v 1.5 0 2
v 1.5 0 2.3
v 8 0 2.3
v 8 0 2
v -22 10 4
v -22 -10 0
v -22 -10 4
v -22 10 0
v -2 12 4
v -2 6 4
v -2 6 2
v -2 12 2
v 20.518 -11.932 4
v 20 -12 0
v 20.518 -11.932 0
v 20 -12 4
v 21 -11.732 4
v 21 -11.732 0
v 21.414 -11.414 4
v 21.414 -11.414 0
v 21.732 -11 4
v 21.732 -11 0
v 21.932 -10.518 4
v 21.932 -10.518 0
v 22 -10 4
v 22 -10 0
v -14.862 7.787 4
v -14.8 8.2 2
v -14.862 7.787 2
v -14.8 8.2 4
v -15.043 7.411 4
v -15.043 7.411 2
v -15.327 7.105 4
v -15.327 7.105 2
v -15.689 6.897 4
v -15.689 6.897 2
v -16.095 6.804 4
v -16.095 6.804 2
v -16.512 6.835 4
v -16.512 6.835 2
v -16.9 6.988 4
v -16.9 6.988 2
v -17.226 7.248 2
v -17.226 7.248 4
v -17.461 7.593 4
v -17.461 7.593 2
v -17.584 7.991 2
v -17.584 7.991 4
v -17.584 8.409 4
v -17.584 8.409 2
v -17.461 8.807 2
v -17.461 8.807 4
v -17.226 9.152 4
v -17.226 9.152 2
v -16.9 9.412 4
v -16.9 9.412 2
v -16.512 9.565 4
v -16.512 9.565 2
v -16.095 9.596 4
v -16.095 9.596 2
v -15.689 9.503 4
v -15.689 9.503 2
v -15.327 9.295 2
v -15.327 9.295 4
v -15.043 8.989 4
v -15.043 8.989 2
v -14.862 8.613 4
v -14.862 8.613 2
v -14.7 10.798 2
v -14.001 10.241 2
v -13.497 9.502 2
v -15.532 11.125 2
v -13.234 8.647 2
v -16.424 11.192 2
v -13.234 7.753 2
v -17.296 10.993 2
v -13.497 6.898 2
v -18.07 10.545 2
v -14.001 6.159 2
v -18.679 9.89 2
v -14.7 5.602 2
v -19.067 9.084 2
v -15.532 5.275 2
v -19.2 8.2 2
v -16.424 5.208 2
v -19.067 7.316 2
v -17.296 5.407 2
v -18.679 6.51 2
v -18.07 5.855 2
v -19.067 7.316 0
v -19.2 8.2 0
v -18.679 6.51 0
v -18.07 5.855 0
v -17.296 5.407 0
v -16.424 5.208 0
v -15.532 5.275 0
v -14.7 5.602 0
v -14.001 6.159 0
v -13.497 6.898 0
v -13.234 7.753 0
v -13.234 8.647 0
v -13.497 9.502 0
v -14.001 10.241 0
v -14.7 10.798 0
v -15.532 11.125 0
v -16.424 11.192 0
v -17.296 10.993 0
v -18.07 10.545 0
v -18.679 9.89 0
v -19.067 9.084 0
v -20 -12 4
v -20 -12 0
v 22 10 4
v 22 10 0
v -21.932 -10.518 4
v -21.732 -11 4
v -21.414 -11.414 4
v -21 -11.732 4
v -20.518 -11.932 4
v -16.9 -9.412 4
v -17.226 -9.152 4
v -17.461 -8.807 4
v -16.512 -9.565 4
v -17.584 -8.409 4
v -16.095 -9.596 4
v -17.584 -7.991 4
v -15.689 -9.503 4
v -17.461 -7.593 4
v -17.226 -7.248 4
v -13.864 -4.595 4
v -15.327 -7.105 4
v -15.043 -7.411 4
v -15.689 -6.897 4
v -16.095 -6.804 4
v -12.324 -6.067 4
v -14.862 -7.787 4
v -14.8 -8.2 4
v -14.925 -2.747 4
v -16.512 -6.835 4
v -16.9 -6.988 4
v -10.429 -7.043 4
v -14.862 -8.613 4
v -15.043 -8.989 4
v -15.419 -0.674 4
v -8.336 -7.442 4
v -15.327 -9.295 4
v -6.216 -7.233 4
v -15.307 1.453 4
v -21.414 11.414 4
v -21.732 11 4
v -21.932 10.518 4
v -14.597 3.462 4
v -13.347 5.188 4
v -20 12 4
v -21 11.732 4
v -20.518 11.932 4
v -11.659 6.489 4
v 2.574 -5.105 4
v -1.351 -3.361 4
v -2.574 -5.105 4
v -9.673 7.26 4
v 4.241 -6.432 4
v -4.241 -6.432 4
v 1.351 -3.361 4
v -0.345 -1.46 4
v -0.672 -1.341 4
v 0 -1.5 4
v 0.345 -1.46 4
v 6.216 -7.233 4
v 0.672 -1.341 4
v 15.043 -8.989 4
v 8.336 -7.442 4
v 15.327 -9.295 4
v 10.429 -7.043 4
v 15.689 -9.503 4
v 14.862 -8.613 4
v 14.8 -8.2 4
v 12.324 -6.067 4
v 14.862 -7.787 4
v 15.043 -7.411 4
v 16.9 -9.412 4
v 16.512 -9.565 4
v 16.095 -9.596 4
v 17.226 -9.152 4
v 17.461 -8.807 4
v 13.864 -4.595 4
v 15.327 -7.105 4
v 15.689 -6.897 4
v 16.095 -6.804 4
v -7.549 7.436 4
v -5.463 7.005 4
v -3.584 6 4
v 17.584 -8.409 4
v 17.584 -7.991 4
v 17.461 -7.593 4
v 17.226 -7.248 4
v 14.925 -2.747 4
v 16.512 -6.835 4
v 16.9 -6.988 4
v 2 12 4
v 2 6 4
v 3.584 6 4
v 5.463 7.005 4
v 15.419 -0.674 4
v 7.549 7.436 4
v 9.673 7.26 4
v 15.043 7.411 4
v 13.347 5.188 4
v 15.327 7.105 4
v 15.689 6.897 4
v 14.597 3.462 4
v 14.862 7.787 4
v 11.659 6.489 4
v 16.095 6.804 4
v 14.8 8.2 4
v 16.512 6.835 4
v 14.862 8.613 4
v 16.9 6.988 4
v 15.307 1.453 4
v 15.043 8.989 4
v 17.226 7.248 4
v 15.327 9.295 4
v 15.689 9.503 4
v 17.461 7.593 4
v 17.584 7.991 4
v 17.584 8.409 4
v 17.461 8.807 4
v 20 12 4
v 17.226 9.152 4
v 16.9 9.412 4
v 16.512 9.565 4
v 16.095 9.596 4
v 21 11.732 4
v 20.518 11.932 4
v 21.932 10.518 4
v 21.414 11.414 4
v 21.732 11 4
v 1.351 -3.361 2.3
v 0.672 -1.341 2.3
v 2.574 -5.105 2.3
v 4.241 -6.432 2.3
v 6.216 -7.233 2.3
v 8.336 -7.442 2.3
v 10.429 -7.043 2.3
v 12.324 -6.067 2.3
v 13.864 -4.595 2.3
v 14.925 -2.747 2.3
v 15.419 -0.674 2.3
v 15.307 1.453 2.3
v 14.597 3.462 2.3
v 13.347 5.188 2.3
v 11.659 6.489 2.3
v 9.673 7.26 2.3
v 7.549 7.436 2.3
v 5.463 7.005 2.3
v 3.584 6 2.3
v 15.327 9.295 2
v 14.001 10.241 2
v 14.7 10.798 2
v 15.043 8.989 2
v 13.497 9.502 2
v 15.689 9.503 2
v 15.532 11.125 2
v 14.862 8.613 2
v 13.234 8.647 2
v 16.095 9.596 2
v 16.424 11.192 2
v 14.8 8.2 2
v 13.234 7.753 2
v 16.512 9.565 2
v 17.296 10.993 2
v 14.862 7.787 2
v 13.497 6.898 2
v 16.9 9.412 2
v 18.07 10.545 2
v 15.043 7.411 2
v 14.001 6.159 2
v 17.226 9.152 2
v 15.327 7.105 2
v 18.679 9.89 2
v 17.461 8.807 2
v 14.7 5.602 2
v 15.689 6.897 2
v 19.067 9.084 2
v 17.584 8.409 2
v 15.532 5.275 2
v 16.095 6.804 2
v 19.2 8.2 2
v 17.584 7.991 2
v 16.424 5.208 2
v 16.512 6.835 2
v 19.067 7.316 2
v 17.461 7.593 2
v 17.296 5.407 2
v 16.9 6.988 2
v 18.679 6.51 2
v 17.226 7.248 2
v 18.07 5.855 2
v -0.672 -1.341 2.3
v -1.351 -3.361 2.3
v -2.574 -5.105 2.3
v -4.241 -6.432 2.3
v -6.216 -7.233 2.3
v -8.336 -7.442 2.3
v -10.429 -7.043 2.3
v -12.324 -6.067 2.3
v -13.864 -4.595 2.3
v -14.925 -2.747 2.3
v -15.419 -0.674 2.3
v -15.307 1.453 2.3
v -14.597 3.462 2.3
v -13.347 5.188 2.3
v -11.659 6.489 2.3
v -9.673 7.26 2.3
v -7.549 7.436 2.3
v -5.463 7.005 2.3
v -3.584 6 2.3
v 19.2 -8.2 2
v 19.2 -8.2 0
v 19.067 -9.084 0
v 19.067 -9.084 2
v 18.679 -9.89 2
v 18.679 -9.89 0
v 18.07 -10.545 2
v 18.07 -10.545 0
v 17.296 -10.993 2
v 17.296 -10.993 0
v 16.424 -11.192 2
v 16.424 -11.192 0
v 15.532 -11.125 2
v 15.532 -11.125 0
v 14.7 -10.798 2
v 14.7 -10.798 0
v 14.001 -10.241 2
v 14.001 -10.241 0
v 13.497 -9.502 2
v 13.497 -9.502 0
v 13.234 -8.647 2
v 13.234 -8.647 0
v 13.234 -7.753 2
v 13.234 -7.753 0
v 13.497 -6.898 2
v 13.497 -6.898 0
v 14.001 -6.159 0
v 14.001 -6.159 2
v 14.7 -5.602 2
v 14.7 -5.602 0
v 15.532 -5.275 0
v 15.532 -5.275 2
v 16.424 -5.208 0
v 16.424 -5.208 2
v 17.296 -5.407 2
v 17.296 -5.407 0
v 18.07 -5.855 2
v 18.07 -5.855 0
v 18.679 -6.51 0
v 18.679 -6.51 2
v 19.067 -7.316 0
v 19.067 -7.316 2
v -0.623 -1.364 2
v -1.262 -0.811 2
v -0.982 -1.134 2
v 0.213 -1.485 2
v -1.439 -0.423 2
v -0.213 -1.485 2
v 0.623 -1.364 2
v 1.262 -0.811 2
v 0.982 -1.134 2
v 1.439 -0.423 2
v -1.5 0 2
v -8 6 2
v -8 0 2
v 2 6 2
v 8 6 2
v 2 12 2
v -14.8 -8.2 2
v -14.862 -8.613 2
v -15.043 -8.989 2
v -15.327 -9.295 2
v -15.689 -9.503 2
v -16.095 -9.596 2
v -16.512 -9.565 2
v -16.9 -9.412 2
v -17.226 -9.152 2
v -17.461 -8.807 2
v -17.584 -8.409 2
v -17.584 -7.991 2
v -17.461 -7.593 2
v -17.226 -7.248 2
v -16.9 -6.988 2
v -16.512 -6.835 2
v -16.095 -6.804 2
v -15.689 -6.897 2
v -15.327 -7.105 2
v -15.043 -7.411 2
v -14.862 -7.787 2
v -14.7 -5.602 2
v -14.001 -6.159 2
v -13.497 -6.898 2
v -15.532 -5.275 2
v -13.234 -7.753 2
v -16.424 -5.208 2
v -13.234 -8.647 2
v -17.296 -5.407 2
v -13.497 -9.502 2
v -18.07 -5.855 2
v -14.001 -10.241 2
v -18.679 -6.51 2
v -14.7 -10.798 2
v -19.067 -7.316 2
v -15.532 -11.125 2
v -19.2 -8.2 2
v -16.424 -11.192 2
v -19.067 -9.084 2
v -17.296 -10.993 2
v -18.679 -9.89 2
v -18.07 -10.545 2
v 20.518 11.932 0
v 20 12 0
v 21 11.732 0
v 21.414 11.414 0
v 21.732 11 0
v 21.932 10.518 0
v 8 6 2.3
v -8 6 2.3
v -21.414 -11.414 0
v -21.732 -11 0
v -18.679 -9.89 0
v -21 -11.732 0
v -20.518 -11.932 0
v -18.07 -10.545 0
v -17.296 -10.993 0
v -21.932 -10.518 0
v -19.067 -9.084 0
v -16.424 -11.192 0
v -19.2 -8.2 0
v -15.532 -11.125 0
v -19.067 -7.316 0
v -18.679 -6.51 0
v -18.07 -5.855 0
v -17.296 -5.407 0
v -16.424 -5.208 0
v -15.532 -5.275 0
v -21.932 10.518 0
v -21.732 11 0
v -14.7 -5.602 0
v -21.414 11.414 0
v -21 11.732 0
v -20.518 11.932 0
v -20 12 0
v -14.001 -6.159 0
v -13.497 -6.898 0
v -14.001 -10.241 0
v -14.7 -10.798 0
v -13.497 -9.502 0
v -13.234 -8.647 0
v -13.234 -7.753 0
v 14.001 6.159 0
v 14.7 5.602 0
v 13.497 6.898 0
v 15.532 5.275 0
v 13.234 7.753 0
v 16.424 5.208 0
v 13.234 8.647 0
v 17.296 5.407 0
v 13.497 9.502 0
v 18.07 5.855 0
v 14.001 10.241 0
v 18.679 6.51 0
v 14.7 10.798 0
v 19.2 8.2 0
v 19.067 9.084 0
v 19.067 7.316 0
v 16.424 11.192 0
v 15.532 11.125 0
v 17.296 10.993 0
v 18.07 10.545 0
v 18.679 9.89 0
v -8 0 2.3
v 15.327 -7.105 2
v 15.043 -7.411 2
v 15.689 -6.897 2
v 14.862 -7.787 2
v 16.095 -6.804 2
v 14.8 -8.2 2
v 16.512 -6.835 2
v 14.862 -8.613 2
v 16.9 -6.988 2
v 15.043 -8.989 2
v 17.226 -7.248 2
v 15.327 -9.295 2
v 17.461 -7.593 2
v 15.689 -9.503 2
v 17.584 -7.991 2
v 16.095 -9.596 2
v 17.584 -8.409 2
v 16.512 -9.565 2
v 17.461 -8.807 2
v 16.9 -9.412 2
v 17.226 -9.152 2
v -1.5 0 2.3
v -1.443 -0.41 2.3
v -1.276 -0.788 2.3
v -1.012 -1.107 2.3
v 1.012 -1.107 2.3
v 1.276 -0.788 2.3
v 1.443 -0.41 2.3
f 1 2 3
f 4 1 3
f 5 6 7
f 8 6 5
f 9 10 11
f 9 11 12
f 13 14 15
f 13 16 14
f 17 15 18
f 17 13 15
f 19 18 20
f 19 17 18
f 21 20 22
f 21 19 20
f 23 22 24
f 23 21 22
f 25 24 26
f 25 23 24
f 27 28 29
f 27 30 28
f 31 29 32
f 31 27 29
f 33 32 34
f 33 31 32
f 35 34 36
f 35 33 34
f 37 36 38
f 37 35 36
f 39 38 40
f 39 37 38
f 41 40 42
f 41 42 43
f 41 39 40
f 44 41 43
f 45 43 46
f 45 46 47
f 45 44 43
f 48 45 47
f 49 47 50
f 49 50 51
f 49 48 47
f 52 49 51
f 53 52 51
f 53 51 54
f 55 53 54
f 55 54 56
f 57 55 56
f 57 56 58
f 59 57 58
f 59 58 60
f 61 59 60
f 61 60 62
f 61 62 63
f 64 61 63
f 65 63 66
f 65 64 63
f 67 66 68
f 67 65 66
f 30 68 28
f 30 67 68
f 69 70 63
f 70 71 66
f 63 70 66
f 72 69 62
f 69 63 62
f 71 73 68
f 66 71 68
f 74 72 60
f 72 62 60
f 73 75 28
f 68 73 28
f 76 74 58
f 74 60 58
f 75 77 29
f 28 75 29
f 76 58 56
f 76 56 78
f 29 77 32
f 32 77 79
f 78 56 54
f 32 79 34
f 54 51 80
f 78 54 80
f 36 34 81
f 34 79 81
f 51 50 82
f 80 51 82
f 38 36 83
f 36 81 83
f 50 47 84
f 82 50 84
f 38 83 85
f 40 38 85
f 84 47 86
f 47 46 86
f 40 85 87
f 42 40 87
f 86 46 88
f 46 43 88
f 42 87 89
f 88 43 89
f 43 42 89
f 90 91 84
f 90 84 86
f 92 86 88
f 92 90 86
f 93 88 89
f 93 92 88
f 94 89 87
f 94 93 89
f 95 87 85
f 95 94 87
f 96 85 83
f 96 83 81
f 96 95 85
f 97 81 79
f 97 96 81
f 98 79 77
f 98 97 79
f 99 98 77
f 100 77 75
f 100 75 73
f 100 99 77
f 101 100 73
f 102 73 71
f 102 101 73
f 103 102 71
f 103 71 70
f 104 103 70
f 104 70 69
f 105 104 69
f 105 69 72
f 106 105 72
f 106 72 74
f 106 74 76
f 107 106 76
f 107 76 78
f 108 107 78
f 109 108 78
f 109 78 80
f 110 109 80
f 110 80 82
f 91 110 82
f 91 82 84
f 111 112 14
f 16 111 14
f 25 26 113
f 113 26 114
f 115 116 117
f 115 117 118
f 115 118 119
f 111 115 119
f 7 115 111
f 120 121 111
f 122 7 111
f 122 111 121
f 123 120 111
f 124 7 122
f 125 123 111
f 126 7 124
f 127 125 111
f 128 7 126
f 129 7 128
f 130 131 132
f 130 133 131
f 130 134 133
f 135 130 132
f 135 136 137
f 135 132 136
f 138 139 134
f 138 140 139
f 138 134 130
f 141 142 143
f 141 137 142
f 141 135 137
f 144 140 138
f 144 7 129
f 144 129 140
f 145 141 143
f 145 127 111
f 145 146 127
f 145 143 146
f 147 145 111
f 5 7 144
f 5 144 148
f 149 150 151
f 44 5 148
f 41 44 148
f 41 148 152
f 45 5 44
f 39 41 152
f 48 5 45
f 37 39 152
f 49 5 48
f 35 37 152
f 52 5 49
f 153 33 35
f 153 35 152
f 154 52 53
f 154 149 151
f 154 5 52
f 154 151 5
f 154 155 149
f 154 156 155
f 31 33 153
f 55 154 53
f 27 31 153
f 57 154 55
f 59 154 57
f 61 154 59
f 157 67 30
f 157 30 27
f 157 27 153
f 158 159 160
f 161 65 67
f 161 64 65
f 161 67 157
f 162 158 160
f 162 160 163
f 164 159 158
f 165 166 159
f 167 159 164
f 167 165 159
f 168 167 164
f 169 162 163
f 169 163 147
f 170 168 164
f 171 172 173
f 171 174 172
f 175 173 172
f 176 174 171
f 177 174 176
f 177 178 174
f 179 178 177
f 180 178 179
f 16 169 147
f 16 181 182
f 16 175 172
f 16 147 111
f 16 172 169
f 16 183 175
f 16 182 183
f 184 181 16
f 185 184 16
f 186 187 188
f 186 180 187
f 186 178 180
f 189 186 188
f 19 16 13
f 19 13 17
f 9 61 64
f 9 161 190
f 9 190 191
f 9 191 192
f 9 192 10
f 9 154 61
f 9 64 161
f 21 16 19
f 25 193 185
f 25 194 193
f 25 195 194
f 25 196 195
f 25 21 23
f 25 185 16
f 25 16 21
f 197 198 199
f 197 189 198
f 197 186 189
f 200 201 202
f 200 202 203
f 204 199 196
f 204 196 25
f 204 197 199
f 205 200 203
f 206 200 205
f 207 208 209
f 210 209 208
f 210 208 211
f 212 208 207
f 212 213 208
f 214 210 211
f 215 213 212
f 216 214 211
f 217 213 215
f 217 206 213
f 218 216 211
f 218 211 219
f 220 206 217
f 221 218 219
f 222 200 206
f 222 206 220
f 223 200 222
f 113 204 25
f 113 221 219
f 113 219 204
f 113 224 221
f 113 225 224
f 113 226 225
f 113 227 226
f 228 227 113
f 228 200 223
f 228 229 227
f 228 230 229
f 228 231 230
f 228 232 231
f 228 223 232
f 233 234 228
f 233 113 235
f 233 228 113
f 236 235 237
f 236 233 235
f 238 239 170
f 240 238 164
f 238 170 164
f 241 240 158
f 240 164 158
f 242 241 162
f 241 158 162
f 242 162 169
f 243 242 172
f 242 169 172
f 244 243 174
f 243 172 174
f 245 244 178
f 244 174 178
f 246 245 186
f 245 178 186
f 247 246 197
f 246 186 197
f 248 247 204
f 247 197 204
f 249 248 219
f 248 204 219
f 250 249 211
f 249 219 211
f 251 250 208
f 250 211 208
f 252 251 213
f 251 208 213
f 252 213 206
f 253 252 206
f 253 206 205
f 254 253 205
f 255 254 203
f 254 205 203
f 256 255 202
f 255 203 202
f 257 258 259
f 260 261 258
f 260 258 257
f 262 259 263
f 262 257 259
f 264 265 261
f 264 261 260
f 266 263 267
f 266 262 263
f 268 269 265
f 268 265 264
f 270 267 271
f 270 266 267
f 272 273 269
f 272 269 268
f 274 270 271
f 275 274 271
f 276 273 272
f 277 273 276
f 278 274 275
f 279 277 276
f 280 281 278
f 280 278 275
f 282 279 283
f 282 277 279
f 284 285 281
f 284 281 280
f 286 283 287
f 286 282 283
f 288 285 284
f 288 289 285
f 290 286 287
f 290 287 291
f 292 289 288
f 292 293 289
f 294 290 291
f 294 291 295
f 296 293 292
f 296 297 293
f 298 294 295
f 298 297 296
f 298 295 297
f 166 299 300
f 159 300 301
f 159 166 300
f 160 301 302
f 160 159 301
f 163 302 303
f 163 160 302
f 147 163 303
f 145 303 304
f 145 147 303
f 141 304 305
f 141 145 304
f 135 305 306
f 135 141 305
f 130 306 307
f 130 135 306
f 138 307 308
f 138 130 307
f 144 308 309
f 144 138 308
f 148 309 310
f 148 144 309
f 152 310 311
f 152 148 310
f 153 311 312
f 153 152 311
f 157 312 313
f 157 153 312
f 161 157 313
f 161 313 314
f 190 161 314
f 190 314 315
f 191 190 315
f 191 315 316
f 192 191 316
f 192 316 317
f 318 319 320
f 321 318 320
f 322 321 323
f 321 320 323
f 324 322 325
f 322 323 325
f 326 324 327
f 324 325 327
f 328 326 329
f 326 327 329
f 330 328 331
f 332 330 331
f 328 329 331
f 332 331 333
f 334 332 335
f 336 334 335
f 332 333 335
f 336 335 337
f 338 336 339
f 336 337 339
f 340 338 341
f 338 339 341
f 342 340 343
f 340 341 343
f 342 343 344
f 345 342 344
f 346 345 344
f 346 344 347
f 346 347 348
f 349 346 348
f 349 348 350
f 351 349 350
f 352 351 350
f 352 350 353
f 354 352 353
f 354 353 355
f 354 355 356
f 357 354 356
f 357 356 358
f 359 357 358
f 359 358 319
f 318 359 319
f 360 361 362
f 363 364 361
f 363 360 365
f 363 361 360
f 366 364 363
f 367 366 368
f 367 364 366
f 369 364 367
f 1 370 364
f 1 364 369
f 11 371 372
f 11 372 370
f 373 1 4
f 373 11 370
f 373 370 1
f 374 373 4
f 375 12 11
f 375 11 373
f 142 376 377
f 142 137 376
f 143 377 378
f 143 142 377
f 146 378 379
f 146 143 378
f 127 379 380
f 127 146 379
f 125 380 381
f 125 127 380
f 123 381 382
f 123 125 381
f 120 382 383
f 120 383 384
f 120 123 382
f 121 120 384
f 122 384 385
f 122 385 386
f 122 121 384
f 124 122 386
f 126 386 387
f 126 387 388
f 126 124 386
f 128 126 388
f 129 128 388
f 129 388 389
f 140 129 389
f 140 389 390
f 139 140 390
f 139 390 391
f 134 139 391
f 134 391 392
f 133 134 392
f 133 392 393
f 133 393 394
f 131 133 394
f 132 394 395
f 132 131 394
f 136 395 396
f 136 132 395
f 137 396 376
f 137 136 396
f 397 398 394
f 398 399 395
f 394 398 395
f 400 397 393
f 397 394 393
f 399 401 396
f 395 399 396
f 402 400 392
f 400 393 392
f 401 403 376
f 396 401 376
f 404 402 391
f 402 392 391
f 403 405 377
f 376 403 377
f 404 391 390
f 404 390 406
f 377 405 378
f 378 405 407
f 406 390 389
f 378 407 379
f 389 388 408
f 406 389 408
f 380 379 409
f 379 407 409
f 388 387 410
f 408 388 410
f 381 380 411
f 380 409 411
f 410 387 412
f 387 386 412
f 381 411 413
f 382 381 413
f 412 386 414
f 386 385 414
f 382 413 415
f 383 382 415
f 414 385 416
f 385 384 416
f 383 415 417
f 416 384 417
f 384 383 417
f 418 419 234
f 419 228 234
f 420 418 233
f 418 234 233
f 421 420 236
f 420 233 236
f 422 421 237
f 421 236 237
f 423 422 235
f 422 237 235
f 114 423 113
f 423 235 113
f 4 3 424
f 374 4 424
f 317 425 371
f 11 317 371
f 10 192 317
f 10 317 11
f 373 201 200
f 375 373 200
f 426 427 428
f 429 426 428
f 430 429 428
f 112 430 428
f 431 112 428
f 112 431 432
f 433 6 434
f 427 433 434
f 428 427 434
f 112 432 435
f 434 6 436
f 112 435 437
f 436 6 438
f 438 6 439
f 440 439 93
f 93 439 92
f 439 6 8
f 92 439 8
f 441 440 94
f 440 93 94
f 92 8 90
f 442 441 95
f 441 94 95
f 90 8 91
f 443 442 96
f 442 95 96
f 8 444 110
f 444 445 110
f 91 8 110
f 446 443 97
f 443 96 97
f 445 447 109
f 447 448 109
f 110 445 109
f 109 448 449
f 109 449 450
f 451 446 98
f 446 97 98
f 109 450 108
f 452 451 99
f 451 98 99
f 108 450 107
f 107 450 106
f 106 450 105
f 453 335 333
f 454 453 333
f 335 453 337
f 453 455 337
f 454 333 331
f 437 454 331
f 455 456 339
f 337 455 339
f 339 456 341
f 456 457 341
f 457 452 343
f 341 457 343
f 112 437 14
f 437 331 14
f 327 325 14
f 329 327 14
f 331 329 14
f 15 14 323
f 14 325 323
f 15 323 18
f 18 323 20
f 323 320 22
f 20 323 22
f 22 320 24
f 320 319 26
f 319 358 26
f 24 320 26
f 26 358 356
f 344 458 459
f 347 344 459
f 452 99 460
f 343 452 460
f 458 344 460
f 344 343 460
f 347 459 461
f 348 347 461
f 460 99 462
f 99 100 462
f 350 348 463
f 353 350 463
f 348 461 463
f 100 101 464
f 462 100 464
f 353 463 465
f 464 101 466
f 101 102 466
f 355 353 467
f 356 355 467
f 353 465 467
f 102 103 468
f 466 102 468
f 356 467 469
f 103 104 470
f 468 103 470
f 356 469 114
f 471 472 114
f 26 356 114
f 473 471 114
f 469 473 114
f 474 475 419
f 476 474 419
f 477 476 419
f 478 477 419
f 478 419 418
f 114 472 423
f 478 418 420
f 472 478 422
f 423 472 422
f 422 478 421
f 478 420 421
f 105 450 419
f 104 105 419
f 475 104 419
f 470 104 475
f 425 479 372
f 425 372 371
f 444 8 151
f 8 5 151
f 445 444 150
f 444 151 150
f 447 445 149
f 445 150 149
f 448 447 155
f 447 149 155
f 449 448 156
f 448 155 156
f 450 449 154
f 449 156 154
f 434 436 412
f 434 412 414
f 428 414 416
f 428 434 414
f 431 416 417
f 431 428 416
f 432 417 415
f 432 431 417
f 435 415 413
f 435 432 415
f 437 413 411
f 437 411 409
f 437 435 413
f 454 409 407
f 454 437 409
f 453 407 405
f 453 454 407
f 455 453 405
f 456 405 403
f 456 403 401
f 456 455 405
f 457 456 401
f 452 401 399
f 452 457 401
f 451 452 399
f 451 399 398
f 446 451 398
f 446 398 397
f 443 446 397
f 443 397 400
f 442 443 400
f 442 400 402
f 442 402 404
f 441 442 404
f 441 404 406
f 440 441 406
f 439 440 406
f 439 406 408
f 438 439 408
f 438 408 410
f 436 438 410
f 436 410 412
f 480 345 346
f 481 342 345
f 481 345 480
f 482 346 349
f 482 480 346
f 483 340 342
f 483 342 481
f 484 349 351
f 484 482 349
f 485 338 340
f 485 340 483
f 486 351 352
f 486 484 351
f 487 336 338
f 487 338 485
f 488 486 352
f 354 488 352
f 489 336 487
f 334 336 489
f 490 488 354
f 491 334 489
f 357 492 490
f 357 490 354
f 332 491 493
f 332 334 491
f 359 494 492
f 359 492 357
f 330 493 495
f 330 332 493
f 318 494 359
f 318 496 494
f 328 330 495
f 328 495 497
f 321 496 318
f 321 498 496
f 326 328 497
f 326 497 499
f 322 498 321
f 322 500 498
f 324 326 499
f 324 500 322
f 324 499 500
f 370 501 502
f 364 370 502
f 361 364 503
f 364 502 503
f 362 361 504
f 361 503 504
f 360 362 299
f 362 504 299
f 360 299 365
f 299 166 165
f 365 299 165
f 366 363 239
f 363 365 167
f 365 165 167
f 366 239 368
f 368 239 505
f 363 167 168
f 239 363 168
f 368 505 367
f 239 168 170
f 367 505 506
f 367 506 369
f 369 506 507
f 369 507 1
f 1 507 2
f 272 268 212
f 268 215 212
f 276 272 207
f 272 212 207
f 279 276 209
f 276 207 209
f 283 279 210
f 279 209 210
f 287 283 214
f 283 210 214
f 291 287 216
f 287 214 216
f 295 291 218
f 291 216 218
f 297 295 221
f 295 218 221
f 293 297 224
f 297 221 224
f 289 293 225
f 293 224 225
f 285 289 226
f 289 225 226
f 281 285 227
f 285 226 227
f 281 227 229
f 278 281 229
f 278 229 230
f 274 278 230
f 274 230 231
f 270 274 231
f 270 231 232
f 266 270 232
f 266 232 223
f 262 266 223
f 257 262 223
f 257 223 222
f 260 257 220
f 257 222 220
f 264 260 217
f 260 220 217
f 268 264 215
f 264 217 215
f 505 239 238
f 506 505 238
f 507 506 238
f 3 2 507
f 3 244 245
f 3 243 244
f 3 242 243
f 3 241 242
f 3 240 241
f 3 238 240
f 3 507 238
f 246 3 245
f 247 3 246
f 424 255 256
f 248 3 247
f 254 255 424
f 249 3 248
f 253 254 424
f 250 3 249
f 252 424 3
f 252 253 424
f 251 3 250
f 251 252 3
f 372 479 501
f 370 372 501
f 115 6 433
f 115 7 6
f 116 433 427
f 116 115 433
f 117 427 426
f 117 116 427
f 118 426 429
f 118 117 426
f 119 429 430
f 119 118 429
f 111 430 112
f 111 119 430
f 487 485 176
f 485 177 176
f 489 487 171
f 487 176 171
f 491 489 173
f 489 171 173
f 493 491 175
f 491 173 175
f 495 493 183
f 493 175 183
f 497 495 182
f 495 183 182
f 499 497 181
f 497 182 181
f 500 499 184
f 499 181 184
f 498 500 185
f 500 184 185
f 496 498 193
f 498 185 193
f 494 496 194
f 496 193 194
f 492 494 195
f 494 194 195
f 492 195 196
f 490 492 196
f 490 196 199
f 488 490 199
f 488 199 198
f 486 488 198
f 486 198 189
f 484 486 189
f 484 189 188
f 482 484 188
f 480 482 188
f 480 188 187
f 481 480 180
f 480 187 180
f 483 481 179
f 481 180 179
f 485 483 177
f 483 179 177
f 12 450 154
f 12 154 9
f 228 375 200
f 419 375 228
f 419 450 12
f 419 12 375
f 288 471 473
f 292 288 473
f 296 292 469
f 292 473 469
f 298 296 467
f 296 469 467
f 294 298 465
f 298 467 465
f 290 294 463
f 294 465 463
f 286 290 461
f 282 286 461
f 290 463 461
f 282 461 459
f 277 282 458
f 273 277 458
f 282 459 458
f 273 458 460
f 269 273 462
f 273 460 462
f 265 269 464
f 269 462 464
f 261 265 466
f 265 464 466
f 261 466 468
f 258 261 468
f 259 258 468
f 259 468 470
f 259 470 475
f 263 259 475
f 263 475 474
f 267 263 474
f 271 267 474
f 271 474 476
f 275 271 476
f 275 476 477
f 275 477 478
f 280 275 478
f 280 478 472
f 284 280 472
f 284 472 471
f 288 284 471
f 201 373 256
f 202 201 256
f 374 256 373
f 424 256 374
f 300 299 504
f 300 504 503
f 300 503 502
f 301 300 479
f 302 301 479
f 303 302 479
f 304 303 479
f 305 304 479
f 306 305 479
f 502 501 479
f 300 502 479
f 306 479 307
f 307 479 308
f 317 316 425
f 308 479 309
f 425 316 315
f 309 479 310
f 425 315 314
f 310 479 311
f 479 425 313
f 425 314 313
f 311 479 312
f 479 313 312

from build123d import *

# Parameters (mm, degrees)
SKETCH051_W         = 44
SKETCH051_H         = 24
PAD014_DEPTH        = 4
SKETCH052_R         = 7.45
POCKET015_DEPTH     = 1.7
SKETCH053_R         = 1.5
SKETCH053_W         = 16
SKETCH053_H         = 6
SKETCH053_W_2       = 4
POCKET016_DEPTH     = 2
HOLE022_D           = 2.8
HOLE022_DEPTH       = 25
HOLE022_CBORE_D     = 6
HOLE022_CBORE_DEPTH = 2
FILLET020_R         = 2


with BuildPart() as part:
    # Sketch051 → Pad014 (new body)
    with BuildSketch(Plane.XY):
        Rectangle(SKETCH051_W, SKETCH051_H)
    extrude(amount=PAD014_DEPTH)

    # Sketch052 (on Face6 of Pad014) → Pocket015 (cut)
    with BuildSketch(Plane.XY.offset(4)):
        with Locations((8, 0)):
            Circle(SKETCH052_R)
    pocket015 = extrude(amount=-POCKET015_DEPTH, mode=Mode.SUBTRACT)

    # Mirrored025: Pocket015 across Sketch052 V_Axis
    add(pocket015.mirror(Plane(origin=(0, 0, 4), x_dir=(0, 0, 1), z_dir=(1, 0, 0))), mode=Mode.SUBTRACT)

    # Sketch053 (on Face5 of Mirrored025) → Pocket016 (cut)
    with BuildSketch(Plane.XY.offset(4)):
        Circle(SKETCH053_R)
        with Locations((0, 3)):
            Rectangle(SKETCH053_W, SKETCH053_H)
        with Locations((0, 9)):
            Rectangle(SKETCH053_W_2, SKETCH053_H)
    extrude(amount=-POCKET016_DEPTH, mode=Mode.SUBTRACT)

    # Hole022
    with Locations(Plane(origin=(0, 0, 0), x_dir=(1, 0, 0), z_dir=(0, 0, -1))):
        with Locations((16.2, 8.2), (16.2, -8.2)):
            hole022 = CounterBoreHole(HOLE022_D / 2, HOLE022_CBORE_D / 2, HOLE022_CBORE_DEPTH, depth=HOLE022_DEPTH)

    # Mirrored026: Hole022 across Sketch054 V_Axis
    add(hole022.mirror(Plane(origin=(0, 0, 0), x_dir=(0, 0, -1), z_dir=(1, 0, 0))), mode=Mode.SUBTRACT)

    # Fillet020
    fillet020_edges = [part.edges().sort_by_distance(p)[0] for p in [
        (-22, 12, 2),
        (-22, -12, 2),
        (22, -12, 2),
        (22, 12, 2),
    ]]
    fillet(fillet020_edges, radius=FILLET020_R)


solid = part.part
